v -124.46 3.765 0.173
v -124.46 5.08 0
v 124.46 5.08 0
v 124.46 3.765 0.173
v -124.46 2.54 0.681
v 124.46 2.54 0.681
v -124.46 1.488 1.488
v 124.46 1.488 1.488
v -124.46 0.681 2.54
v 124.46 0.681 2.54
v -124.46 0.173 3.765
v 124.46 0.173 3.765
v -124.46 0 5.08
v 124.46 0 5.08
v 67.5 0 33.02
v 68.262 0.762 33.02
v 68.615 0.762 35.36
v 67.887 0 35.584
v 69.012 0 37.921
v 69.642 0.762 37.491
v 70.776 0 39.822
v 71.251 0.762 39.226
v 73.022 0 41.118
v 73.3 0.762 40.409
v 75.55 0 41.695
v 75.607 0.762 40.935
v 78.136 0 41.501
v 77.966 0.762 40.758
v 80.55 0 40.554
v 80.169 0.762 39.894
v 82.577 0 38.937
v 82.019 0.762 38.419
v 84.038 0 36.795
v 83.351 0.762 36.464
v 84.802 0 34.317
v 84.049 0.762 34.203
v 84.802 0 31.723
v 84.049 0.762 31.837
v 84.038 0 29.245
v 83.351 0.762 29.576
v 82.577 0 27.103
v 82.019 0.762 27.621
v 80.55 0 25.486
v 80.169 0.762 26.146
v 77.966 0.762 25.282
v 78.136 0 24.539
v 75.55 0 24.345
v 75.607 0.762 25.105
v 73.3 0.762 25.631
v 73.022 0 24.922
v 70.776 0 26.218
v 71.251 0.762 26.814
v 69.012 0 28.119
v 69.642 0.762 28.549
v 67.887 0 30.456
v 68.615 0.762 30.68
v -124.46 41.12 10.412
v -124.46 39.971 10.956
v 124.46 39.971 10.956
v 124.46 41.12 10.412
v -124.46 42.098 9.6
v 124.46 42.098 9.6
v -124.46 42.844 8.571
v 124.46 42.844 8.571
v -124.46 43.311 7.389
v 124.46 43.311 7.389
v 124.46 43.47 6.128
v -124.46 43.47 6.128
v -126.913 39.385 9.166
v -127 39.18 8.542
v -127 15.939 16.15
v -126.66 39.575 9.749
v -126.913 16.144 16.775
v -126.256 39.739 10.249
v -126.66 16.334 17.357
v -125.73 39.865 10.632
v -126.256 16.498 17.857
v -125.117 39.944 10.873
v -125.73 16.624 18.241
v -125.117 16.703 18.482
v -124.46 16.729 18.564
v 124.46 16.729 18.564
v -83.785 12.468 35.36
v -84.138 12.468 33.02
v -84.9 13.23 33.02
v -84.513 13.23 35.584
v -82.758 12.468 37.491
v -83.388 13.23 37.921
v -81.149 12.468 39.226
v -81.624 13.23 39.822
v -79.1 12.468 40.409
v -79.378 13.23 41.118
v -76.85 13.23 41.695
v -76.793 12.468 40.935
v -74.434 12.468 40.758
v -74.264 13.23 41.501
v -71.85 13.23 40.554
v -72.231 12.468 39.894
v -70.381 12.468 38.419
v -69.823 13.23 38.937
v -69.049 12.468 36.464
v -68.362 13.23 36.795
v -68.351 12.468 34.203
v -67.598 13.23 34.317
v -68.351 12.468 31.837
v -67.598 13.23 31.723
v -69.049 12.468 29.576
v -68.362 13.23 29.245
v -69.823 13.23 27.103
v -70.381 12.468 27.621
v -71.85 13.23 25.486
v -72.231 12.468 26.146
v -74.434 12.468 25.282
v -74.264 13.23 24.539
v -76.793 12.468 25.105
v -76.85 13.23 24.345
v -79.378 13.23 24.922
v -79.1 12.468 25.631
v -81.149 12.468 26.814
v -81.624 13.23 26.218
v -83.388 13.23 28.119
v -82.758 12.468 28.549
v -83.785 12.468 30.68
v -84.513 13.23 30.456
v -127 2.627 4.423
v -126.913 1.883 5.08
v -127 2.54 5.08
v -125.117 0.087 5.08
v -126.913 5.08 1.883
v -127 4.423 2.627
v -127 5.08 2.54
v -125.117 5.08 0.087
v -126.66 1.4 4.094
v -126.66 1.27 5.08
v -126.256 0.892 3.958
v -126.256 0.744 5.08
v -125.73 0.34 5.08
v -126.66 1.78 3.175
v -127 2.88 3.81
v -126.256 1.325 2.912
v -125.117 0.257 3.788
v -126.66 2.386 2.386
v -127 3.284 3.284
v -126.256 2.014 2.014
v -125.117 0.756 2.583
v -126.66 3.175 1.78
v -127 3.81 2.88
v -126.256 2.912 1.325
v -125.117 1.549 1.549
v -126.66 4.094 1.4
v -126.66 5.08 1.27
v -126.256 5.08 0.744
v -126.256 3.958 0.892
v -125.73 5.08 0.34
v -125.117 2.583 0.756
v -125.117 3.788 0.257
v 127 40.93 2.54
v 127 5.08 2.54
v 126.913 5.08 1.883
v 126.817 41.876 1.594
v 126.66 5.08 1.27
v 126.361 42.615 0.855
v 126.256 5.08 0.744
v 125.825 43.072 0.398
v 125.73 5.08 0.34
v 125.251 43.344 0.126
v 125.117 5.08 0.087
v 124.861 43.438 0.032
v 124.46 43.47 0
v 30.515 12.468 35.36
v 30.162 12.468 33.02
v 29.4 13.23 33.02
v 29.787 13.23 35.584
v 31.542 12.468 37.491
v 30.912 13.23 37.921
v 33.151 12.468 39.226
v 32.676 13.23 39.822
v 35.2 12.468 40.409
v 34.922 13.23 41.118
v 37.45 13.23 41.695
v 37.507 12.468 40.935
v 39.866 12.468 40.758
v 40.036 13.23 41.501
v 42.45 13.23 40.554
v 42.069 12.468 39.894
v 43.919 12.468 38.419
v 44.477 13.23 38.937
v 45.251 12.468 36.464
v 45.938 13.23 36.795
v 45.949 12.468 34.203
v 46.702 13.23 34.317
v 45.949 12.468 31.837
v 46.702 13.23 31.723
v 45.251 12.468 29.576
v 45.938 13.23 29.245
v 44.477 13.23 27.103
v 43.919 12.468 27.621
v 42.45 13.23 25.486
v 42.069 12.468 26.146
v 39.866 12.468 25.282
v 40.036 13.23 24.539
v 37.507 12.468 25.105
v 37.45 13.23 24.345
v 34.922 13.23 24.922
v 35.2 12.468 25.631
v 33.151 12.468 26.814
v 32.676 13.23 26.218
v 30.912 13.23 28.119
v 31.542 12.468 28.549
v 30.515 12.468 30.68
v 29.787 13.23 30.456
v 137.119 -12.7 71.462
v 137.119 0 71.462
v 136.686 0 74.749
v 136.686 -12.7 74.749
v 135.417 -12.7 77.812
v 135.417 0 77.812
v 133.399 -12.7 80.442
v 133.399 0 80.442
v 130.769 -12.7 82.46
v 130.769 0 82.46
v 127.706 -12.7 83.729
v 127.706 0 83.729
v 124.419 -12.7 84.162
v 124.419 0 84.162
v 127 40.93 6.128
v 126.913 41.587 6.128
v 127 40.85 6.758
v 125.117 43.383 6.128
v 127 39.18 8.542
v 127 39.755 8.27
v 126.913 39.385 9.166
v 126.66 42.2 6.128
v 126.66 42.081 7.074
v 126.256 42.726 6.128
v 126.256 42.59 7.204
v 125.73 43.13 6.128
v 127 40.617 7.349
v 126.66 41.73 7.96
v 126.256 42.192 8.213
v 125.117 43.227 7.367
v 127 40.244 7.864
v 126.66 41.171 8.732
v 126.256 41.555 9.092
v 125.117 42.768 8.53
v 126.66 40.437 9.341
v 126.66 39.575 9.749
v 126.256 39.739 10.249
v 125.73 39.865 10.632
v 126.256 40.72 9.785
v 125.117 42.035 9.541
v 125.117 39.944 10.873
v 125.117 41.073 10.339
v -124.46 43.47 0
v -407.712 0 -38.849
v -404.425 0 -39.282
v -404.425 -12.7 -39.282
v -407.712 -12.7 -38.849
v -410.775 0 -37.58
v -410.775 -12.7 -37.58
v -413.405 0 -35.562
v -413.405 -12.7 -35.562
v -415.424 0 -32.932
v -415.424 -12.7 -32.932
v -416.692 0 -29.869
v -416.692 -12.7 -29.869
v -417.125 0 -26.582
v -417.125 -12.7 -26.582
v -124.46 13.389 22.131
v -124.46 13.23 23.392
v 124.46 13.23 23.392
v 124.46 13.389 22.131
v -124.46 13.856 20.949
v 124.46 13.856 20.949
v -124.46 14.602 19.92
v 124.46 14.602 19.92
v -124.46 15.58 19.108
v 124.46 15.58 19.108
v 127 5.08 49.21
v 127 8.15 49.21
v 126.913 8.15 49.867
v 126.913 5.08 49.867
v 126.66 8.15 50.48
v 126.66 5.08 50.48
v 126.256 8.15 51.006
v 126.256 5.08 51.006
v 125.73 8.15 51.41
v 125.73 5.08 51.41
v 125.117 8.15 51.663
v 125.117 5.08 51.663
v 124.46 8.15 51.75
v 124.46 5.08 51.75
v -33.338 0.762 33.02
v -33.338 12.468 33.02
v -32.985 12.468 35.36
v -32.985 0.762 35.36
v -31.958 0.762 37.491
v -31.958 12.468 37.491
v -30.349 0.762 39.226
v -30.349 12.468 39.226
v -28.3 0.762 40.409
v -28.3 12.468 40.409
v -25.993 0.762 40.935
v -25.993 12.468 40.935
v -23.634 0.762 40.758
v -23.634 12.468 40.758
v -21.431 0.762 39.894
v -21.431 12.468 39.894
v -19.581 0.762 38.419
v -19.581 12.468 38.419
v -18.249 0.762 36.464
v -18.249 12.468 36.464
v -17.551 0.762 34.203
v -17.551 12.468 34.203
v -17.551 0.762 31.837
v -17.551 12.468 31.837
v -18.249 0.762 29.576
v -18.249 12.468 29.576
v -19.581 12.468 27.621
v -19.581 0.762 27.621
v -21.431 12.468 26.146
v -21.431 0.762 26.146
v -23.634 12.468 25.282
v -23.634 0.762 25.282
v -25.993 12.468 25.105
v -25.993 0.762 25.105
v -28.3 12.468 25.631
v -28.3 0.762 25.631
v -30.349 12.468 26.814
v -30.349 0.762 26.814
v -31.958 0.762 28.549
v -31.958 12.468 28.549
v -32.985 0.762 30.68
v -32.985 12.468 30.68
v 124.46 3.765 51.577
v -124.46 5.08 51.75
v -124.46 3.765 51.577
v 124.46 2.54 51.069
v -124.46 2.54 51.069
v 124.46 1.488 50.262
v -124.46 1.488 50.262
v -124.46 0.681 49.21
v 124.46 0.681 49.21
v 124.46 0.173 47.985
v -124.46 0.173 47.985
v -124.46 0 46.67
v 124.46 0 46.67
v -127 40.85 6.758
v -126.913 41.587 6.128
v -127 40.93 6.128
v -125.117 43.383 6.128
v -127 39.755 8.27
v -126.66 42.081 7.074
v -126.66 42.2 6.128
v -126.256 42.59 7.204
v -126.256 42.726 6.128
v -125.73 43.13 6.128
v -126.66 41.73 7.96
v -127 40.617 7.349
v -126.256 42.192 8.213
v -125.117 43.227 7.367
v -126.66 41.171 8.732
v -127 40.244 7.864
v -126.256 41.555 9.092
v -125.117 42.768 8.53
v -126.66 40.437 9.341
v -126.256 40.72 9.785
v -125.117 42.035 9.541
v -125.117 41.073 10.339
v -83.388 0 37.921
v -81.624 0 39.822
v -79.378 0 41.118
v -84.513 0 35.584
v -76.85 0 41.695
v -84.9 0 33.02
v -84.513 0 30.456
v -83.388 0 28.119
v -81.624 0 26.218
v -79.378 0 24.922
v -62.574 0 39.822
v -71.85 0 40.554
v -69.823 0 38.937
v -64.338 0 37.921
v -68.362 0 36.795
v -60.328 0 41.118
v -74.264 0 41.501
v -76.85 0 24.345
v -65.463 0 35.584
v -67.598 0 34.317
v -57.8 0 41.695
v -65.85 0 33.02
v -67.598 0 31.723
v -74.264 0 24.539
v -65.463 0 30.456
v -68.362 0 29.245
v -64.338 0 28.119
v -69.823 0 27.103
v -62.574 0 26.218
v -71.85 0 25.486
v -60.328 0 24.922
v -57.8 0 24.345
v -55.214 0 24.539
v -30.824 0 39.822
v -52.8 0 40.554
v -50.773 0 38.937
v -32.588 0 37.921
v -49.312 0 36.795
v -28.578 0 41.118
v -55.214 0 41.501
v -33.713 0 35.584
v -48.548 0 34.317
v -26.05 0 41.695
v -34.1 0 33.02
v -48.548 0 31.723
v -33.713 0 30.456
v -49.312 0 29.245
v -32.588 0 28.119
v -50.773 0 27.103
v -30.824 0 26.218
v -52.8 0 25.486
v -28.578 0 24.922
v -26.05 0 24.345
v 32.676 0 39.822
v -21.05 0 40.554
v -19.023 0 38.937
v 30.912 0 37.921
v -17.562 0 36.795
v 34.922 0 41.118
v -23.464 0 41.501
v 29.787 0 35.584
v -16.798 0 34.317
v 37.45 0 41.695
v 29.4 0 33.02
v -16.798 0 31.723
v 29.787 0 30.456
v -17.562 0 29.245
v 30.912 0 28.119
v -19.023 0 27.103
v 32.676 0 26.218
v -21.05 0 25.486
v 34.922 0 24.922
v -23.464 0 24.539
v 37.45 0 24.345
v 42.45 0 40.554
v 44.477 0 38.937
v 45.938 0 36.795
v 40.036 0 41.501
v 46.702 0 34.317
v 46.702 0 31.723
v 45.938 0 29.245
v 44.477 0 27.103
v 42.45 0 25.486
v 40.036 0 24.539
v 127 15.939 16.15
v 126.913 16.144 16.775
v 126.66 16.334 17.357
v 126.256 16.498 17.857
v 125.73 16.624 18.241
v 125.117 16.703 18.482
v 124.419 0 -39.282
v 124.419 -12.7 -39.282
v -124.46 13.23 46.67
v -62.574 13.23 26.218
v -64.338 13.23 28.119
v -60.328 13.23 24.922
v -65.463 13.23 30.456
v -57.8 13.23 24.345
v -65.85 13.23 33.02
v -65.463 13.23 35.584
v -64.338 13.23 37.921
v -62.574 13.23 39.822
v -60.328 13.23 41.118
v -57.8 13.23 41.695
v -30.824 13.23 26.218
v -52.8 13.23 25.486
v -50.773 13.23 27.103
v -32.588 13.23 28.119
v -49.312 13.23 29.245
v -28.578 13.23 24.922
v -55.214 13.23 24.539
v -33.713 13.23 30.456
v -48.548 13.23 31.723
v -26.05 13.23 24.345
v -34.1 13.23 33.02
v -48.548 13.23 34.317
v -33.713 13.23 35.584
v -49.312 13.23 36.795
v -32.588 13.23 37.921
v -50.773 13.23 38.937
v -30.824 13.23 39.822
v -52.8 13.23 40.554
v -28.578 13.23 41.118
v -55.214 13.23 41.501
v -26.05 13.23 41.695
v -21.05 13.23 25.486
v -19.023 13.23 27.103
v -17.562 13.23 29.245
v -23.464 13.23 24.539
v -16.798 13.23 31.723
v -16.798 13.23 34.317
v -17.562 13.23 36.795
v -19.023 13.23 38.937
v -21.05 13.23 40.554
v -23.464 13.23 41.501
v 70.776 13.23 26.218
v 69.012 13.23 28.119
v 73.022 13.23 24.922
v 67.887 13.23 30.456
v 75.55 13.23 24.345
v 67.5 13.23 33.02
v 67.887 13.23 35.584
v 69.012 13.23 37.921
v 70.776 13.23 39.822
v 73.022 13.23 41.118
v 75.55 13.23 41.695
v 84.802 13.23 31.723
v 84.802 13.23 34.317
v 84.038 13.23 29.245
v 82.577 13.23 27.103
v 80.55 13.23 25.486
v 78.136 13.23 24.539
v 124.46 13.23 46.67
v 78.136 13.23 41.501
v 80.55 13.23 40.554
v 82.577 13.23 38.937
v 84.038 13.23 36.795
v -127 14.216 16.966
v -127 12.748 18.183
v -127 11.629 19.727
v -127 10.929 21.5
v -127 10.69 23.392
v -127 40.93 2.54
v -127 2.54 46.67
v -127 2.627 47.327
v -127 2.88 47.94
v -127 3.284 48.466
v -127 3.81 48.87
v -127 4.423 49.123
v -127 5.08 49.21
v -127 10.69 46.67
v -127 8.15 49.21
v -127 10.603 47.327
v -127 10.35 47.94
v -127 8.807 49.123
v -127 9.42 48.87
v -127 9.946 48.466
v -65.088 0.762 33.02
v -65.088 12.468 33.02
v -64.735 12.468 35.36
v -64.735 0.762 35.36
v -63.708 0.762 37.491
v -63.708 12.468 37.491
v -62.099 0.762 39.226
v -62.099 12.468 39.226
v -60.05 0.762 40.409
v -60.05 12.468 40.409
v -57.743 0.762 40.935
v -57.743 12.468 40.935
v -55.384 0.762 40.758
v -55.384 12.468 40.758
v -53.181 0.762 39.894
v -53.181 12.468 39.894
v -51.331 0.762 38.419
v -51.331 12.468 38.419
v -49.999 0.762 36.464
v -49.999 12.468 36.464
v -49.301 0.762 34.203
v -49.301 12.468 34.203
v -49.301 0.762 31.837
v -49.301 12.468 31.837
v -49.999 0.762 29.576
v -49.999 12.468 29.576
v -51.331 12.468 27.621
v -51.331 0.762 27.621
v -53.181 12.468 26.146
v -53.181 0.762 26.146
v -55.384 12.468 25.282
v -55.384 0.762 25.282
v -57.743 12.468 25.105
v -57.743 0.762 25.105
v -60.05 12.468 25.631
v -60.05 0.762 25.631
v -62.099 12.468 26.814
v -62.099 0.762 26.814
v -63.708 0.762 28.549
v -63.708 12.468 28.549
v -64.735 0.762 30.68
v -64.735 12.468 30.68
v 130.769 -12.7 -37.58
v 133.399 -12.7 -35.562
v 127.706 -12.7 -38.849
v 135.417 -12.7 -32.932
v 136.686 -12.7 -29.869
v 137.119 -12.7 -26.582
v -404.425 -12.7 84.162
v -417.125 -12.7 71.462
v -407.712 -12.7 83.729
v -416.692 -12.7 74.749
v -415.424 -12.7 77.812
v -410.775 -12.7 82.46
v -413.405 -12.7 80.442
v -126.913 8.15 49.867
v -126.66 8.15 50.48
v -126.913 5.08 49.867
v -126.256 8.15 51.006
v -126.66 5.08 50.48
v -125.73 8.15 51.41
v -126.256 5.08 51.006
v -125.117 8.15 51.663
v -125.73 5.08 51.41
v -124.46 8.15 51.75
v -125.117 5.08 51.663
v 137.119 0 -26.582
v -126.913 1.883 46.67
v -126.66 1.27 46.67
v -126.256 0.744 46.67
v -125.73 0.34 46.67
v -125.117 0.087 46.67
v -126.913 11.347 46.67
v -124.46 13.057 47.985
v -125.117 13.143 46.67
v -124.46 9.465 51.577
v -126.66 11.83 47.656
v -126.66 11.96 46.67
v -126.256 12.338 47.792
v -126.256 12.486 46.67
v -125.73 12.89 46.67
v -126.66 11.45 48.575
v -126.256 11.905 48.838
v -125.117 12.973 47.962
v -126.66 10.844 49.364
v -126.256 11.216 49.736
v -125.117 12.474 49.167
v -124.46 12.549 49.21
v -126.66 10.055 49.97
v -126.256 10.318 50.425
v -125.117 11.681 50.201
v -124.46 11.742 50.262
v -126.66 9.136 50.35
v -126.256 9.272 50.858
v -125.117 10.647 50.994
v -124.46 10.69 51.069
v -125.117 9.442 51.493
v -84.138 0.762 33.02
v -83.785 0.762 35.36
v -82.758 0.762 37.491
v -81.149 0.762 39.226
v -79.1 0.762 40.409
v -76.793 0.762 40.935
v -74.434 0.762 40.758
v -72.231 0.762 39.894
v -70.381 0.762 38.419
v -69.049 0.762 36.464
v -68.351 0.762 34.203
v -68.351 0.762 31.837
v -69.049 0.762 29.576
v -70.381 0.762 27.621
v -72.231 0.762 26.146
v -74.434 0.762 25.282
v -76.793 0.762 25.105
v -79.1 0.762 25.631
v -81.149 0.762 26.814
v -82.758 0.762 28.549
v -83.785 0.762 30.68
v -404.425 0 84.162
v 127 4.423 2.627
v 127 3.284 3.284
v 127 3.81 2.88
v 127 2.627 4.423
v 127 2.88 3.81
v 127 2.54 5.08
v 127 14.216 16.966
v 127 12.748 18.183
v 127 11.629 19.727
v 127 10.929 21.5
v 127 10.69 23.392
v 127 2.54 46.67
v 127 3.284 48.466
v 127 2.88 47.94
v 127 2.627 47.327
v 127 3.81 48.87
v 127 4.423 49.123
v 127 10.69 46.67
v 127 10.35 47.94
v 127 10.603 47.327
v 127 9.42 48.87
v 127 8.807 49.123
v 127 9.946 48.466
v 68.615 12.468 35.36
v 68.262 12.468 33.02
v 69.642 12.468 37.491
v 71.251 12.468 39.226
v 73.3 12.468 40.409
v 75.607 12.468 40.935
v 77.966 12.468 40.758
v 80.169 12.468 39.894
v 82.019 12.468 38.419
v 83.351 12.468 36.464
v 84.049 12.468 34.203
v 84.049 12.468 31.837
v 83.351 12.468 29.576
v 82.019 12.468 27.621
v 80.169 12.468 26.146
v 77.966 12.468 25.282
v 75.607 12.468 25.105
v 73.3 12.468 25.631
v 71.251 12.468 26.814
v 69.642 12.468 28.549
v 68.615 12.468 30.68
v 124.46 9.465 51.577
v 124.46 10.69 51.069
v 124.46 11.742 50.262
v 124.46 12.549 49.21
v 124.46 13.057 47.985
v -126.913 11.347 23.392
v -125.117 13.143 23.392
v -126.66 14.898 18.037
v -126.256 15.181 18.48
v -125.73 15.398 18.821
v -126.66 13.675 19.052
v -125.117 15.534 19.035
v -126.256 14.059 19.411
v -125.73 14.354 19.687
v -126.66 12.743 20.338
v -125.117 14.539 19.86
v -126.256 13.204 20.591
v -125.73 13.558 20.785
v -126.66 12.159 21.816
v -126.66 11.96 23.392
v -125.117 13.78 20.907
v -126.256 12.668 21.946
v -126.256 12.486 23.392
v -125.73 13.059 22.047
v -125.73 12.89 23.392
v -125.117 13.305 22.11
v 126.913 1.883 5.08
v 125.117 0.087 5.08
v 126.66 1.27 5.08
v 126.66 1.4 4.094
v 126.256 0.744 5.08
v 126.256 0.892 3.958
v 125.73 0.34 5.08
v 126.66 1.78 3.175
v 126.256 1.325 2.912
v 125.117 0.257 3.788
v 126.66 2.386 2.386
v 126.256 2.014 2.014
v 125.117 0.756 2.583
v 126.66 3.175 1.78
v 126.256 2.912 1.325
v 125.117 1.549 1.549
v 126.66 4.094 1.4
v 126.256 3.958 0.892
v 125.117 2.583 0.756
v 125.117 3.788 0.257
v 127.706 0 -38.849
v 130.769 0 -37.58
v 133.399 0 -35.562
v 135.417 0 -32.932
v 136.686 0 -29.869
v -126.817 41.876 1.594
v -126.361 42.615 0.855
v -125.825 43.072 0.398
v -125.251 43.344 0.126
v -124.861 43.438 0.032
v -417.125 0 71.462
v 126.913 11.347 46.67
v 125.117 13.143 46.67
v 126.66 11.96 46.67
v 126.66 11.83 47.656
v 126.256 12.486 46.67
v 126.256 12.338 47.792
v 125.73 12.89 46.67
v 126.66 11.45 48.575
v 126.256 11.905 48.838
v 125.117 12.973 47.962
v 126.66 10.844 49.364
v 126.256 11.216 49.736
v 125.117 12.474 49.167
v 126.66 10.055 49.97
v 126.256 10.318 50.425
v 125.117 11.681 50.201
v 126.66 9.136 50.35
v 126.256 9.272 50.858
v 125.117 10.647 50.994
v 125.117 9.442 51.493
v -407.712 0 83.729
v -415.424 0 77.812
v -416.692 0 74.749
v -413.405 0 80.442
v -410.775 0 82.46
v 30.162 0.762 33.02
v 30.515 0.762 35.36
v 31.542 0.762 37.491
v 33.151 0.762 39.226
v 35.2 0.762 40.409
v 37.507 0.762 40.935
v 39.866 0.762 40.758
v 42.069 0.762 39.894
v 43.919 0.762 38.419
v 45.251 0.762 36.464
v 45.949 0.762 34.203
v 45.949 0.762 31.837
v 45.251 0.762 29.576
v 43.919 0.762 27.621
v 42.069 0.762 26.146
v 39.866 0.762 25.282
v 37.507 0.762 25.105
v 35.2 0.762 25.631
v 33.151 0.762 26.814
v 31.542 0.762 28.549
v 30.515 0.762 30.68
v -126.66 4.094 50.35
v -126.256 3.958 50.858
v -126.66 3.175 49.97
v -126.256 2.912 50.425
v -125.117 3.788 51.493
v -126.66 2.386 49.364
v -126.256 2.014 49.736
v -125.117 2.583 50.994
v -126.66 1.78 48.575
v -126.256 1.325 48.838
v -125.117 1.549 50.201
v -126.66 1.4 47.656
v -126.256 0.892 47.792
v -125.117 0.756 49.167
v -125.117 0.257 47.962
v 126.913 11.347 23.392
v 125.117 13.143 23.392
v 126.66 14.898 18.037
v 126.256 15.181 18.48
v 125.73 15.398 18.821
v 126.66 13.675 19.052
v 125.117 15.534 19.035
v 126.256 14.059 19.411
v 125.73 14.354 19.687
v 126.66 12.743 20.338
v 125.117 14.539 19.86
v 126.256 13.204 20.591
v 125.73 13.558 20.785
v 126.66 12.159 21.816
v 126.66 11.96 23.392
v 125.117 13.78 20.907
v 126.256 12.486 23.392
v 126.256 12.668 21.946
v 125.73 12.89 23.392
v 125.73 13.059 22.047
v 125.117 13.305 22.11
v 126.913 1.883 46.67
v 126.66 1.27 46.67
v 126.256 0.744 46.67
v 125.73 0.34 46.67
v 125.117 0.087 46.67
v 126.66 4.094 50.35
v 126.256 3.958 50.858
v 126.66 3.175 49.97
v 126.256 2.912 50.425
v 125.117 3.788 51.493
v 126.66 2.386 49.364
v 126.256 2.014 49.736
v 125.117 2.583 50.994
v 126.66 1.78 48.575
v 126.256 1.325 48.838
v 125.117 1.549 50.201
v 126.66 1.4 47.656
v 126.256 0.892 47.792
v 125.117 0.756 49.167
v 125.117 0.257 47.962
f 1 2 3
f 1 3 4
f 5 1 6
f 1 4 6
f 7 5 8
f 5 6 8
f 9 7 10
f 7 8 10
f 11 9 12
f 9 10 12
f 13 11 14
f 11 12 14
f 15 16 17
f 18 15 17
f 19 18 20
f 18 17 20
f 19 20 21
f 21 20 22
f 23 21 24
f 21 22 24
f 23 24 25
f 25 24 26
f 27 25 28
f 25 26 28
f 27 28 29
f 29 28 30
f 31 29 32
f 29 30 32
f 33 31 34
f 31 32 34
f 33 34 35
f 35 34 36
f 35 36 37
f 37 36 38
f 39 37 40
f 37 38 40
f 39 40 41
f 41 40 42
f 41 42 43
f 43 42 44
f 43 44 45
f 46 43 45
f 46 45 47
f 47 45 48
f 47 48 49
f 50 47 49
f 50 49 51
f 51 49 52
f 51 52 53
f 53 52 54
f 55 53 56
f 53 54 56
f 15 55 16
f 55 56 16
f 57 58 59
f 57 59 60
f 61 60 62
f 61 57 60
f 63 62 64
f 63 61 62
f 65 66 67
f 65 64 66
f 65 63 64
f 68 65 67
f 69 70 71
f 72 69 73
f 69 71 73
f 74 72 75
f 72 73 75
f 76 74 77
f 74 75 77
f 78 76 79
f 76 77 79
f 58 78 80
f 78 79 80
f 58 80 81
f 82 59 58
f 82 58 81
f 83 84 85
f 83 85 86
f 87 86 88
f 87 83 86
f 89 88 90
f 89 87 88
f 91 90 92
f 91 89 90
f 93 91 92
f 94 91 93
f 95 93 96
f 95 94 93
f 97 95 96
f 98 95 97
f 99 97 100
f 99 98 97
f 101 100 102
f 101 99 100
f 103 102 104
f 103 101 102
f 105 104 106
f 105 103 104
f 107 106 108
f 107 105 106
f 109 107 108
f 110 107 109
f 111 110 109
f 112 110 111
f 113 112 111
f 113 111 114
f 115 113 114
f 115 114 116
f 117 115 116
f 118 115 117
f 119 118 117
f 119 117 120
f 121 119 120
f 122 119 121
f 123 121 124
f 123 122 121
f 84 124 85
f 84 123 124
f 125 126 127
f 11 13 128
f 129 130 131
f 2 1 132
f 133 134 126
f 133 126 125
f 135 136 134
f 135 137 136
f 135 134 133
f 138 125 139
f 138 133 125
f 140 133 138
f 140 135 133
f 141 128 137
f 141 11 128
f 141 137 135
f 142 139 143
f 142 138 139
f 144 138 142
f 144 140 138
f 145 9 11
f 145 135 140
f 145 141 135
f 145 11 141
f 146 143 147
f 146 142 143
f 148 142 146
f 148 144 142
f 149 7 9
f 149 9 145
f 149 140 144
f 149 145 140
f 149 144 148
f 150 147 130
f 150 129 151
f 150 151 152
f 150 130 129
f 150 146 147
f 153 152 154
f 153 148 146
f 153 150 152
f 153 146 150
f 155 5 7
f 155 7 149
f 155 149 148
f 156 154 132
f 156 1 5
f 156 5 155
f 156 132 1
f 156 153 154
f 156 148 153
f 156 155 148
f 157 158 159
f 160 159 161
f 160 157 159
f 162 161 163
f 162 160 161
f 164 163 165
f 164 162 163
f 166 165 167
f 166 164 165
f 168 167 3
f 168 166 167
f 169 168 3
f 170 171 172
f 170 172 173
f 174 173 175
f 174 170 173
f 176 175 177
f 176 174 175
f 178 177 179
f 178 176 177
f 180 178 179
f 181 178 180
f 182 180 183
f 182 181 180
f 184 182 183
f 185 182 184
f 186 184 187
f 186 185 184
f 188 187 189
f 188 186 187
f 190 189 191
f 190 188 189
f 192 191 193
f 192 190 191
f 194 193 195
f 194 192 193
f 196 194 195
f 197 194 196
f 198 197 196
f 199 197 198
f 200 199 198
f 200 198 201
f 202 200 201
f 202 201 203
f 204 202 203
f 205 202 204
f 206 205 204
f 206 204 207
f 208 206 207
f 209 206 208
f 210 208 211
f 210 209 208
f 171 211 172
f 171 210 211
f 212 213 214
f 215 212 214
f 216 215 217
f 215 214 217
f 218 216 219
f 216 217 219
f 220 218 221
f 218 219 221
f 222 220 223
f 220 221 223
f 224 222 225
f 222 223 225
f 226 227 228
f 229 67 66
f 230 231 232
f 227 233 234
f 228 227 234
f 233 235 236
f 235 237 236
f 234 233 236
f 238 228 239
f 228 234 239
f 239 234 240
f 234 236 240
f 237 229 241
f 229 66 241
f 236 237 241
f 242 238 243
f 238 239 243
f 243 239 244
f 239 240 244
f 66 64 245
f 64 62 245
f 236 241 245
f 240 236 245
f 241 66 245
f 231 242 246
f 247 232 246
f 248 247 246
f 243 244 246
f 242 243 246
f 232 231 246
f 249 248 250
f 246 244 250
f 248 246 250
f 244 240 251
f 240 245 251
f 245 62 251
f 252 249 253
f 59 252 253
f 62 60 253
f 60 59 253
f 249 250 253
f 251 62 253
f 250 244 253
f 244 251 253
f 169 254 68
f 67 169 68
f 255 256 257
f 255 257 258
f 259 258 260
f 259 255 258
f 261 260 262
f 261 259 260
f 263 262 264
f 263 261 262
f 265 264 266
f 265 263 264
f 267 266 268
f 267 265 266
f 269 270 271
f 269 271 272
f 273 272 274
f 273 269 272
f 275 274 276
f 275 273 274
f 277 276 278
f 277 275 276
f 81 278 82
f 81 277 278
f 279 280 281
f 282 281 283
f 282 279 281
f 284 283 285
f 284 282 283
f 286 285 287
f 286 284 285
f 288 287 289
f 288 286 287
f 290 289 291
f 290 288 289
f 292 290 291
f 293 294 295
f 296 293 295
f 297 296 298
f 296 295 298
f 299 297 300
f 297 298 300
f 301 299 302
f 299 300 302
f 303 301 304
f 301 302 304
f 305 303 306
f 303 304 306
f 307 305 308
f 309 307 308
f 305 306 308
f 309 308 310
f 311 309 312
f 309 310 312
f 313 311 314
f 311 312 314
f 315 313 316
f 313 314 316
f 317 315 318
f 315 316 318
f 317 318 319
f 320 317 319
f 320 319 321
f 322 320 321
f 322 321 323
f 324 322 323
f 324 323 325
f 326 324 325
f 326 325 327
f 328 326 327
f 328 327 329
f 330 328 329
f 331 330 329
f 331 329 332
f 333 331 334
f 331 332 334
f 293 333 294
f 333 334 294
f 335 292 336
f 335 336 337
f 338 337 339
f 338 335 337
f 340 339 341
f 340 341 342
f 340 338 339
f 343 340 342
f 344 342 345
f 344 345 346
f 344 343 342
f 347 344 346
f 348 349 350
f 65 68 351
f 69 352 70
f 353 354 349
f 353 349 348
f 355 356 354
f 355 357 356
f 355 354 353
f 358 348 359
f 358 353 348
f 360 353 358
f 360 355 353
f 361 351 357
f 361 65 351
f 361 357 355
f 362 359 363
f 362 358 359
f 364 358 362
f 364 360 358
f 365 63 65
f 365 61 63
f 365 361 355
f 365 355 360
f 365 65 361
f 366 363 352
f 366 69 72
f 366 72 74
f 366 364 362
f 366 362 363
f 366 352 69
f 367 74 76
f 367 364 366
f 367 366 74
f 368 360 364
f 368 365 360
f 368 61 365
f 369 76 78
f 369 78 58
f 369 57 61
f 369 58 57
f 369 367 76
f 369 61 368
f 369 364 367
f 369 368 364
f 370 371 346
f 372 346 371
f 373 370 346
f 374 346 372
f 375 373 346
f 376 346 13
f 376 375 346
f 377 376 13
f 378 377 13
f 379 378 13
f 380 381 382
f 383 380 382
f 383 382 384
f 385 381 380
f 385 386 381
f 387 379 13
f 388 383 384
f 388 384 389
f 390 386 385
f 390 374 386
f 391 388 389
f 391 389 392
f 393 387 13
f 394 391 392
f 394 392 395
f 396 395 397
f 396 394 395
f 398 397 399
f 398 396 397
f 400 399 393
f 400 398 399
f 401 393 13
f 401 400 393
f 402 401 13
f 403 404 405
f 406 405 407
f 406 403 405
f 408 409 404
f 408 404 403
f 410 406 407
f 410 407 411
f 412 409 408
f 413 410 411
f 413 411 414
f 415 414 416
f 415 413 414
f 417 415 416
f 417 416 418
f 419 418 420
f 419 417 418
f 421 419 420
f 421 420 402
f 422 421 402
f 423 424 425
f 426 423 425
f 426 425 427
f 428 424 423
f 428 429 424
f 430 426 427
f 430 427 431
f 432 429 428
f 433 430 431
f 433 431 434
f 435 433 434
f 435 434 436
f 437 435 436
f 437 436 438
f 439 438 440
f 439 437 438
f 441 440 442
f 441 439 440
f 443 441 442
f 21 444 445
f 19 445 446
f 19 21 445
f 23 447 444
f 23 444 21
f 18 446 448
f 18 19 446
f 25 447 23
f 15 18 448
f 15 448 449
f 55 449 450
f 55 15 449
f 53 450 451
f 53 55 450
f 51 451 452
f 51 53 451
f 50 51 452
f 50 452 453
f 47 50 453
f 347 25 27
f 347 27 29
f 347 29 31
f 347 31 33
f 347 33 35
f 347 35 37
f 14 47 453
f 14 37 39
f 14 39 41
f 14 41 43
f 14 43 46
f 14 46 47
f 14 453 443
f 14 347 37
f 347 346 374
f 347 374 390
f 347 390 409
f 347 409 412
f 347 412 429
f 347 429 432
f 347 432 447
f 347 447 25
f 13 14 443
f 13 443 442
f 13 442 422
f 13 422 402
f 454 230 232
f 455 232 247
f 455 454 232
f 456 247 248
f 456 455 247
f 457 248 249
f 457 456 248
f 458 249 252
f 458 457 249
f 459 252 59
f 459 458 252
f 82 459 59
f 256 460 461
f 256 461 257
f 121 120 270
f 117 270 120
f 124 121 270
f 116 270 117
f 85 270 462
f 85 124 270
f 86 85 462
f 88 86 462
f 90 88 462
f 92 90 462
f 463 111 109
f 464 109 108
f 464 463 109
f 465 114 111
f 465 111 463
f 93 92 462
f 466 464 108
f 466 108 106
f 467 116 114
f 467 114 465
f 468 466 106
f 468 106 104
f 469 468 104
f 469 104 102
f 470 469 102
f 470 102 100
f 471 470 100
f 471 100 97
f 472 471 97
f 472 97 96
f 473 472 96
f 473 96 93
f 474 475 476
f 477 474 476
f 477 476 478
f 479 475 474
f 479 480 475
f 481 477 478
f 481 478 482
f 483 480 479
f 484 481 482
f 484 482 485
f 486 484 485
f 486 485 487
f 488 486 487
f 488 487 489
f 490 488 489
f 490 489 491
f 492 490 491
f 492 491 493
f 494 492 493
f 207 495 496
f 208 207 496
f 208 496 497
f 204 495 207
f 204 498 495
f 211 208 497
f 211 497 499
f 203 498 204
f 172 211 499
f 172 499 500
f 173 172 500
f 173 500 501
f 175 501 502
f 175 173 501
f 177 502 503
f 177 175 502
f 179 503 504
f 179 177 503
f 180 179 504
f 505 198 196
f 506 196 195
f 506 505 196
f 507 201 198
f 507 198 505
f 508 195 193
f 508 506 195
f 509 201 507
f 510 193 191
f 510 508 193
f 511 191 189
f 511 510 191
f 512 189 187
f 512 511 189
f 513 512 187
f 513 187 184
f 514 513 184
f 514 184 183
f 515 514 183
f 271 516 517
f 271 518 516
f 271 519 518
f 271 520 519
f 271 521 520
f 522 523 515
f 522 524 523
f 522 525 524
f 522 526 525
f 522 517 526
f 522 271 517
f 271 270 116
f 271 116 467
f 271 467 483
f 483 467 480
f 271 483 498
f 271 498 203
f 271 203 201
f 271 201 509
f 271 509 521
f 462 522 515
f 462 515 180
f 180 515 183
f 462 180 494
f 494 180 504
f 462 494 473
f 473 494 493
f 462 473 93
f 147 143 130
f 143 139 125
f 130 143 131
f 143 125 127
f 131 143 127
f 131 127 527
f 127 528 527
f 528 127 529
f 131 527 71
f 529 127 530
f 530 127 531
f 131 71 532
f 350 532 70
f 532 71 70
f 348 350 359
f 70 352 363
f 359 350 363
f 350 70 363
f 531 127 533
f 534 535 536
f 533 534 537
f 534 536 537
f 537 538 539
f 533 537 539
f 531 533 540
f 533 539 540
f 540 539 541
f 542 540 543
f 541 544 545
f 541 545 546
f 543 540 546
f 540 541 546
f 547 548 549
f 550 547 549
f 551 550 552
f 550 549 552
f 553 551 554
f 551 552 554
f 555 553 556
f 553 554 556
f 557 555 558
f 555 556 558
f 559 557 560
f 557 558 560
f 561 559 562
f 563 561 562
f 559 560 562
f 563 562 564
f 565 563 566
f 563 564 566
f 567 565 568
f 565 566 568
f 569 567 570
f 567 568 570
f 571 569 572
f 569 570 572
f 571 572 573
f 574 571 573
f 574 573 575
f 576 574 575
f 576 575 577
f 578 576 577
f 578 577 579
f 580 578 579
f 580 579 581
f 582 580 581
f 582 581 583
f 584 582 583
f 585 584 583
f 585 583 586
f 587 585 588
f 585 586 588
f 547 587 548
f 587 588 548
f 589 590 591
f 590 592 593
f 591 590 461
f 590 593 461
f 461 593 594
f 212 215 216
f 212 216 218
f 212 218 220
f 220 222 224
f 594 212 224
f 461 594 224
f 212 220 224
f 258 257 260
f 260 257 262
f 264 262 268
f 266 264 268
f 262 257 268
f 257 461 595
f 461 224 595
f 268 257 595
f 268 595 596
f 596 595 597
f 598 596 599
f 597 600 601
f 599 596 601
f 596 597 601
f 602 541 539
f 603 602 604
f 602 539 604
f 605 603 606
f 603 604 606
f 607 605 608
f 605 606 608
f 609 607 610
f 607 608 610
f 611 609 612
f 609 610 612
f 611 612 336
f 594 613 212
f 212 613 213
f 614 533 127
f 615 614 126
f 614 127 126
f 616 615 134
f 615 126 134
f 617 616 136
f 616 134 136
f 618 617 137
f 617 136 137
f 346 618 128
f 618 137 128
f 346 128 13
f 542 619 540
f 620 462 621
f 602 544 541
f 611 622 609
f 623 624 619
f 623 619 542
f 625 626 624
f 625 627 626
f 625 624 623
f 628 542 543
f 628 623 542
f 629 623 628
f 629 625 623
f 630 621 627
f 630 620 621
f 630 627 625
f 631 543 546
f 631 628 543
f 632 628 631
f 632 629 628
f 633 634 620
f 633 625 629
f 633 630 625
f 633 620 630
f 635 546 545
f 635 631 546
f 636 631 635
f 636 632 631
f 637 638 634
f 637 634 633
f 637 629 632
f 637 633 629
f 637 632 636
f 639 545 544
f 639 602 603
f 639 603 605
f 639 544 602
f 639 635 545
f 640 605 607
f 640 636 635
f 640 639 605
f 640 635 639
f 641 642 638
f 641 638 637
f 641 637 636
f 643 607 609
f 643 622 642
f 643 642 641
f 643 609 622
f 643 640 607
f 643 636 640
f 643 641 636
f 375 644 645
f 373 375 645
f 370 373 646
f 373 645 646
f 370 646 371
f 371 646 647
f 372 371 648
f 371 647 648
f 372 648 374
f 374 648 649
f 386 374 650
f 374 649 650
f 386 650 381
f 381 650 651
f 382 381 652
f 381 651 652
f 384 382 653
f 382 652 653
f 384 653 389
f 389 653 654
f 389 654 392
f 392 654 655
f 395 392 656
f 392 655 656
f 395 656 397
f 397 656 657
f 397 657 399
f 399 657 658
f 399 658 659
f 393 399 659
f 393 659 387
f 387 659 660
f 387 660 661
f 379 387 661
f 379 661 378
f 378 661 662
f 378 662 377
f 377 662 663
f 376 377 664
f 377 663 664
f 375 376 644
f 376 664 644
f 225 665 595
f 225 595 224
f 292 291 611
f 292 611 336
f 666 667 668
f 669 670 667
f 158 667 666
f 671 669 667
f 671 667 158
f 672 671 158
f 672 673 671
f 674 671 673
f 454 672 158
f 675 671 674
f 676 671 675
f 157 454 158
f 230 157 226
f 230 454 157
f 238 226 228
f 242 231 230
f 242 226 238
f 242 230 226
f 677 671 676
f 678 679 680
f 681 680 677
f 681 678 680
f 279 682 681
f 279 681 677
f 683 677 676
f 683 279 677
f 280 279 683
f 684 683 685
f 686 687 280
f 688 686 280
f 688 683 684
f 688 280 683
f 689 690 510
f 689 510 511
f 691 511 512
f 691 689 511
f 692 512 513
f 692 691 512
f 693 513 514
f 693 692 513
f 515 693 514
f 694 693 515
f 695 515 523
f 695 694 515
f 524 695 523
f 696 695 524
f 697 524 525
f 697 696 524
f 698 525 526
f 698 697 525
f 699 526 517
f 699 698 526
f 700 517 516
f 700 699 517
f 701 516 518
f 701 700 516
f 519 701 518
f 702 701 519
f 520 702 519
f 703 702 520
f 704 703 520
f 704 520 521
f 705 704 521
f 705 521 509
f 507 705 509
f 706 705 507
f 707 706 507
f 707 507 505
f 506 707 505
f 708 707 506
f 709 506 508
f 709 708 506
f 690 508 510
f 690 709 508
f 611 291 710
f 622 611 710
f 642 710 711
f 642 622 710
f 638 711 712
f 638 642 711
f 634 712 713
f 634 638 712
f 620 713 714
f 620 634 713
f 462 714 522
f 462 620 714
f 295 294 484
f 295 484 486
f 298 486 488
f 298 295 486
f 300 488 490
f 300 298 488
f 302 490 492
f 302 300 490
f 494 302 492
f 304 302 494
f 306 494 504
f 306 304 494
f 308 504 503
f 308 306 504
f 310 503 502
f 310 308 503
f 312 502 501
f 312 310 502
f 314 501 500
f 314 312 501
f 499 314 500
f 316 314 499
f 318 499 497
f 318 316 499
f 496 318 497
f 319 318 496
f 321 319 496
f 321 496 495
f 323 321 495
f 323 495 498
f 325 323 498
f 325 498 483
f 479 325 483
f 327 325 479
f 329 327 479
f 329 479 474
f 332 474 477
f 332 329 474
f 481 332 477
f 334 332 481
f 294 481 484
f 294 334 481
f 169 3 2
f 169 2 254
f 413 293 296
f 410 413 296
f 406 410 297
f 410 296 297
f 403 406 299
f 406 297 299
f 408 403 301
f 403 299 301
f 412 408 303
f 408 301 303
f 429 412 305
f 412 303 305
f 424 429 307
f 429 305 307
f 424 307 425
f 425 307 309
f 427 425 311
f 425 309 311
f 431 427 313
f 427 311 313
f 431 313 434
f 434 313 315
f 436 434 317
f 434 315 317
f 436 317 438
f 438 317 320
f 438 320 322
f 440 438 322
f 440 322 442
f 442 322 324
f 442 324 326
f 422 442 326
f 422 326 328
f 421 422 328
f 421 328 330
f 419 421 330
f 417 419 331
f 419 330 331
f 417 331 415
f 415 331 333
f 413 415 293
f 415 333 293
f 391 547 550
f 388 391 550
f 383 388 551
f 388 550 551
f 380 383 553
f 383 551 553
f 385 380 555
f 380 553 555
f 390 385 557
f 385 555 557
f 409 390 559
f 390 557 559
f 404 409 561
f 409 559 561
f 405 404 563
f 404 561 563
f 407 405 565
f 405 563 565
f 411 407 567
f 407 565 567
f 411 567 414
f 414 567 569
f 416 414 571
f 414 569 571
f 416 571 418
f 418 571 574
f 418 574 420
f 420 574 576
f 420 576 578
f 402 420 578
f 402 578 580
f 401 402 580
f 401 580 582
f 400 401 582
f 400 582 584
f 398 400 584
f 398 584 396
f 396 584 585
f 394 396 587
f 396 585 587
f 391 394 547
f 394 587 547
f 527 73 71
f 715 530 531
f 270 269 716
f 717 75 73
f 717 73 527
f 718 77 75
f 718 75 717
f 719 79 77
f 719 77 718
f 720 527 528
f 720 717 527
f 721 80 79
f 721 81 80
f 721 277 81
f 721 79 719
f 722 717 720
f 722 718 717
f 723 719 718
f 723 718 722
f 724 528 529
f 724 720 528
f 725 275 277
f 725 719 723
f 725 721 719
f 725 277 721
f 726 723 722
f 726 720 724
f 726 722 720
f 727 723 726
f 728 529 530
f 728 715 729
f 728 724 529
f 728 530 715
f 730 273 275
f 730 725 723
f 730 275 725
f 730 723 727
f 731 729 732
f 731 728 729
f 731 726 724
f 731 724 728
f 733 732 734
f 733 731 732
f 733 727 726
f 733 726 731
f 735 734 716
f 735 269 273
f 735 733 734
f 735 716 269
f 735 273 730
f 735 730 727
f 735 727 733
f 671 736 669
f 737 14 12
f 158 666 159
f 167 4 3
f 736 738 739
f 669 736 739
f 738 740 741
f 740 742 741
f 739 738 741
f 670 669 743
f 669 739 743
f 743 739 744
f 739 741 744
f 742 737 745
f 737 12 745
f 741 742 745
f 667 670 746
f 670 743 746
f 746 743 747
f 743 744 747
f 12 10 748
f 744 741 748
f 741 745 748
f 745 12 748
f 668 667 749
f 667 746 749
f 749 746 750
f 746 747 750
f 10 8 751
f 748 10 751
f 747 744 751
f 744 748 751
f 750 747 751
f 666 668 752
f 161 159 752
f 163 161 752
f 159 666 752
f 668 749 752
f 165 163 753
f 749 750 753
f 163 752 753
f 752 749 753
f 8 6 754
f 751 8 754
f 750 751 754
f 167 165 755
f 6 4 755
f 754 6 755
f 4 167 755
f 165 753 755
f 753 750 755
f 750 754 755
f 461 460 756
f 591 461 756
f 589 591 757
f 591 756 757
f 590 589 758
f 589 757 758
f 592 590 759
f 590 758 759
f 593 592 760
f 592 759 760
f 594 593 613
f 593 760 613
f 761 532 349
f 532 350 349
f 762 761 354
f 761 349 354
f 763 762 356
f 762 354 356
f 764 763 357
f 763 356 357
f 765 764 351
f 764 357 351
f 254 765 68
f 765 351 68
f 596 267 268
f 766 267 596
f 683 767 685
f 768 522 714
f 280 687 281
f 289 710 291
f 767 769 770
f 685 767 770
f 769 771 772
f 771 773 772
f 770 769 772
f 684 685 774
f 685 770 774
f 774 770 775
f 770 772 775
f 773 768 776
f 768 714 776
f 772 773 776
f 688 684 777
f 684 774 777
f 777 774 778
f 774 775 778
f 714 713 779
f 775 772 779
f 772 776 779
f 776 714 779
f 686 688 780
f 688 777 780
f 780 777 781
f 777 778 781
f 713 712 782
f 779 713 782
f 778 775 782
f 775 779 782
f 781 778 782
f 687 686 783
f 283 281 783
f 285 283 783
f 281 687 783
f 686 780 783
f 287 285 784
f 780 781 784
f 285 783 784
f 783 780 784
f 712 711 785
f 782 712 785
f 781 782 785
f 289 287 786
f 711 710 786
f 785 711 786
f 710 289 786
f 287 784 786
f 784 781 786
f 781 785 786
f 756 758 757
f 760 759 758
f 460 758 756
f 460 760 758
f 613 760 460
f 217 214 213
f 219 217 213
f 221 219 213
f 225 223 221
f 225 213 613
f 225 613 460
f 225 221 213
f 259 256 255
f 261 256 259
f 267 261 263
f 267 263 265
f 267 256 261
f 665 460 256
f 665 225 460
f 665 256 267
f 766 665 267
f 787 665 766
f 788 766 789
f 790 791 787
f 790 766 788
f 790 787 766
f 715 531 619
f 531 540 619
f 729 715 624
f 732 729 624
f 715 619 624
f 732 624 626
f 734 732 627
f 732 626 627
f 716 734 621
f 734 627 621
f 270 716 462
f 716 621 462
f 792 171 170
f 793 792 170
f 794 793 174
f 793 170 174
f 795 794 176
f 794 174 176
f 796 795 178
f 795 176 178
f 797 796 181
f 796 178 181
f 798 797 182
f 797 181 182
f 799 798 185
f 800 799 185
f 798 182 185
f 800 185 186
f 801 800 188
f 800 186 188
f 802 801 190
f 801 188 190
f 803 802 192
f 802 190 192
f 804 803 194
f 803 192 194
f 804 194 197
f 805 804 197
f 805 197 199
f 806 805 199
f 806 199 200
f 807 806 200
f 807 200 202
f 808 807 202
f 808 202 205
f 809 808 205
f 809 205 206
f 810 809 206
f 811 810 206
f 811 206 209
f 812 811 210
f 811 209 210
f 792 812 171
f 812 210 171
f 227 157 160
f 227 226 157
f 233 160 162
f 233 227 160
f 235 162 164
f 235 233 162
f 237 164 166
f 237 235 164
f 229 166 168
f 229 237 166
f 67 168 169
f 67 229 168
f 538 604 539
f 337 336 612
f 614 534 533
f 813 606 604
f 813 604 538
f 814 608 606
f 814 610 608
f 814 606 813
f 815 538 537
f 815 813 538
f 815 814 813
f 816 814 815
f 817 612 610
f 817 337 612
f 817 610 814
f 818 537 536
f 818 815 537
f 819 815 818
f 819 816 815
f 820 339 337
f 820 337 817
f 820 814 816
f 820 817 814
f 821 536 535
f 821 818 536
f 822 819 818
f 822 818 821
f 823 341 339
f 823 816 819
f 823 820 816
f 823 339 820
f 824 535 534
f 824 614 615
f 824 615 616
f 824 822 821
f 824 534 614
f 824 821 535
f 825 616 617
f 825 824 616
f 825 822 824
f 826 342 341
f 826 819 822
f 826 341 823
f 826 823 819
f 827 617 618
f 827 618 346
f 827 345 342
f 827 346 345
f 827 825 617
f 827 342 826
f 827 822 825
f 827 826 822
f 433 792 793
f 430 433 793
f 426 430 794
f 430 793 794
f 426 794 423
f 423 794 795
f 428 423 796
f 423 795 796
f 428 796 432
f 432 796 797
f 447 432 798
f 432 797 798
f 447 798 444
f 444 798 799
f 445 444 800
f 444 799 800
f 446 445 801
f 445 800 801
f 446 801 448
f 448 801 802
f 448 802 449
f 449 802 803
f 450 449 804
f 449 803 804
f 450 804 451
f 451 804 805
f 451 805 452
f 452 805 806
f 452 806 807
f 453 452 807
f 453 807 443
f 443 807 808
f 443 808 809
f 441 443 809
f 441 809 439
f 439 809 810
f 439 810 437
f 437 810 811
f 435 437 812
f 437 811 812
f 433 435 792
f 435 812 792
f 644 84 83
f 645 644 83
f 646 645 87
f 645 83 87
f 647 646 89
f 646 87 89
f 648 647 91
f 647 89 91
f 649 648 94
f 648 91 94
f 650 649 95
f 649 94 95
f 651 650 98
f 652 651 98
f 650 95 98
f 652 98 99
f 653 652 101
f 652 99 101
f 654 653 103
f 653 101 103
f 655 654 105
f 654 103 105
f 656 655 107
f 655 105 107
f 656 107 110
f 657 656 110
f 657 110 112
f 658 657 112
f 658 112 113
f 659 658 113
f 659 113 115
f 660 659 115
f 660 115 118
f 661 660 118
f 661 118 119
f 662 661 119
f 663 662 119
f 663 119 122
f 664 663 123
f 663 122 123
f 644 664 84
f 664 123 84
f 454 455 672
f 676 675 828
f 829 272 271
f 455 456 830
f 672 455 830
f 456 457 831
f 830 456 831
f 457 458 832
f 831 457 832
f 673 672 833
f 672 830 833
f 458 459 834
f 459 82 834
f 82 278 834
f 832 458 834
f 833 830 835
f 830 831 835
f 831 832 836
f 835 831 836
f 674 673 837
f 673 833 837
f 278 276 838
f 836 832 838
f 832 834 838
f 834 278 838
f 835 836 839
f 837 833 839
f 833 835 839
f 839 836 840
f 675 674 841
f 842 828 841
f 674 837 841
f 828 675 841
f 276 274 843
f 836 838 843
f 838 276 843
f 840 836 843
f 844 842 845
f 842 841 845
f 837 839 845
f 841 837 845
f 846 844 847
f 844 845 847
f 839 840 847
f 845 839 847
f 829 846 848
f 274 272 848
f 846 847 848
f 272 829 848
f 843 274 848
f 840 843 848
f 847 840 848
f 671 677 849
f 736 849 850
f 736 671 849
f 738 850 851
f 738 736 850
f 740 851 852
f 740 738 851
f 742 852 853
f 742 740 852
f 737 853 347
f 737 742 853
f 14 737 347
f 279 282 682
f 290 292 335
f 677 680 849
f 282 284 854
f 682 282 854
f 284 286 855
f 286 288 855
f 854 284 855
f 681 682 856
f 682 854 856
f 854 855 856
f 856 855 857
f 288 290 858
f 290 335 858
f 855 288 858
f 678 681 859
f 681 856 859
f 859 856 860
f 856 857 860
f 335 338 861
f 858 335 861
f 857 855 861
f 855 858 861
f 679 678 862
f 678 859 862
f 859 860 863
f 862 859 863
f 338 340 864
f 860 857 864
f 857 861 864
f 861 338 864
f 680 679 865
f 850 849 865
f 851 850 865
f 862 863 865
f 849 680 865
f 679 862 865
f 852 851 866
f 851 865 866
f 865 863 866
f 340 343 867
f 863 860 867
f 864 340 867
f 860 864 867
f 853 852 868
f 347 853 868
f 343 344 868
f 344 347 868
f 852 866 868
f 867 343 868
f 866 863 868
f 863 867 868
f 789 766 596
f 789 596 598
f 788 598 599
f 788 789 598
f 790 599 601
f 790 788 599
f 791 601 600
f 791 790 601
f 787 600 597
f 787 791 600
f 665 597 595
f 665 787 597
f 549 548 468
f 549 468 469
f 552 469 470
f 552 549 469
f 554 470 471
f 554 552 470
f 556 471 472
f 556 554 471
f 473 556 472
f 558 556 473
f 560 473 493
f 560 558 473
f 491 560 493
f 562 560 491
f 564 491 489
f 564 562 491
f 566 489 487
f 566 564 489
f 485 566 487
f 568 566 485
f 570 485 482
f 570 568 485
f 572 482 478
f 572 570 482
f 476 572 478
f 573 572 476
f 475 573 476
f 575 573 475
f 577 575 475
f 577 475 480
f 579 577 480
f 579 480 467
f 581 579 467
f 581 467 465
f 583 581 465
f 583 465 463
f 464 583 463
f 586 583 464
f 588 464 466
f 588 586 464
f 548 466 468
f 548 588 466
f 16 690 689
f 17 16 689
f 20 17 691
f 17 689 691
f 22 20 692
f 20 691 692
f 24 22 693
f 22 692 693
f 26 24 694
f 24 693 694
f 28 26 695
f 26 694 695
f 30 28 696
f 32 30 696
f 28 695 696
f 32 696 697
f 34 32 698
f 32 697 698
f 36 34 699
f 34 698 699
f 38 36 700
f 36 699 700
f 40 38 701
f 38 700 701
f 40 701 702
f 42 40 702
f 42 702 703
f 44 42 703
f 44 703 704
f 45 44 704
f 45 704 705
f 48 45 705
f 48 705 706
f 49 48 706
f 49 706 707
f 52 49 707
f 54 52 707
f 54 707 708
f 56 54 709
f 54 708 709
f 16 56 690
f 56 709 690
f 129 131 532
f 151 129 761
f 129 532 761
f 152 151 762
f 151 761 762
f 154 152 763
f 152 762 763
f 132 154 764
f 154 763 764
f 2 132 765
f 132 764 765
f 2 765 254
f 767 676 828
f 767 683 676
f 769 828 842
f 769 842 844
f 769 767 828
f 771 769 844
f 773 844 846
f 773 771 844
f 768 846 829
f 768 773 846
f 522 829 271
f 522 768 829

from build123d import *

# Parameters (mm, degrees)
F1_DEPTH = 127
F2_R     = 5.08
F3_R     = 2.54
F4_R     = 7.9375
F5_DEPTH = 13.2299996912
F6_SIZE  = 0.762
F8_DEPTH = 12.7


with BuildPart() as f1:
    # F0 (on Right) → F1 (new body, symmetric)
    with BuildSketch(Plane.YZ):
        Polygon((13.2299996912, 51.7500005662), (0, 51.7500005662), (0, 0), (13.2299996912, 0), (43.4699989855, 0), (43.4699989855, 9.810000658), (13.2299996912, 19.7100006044), align=None)
    extrude(amount=F1_DEPTH, both=True)

    # F2
    f2_edges = [f1.edges().sort_by_distance(p)[0] for p in [
        (0, 0, 51.750001),
        (0, 0, 0),
        (0, 43.469999, 9.810001),
        (0, 13.23, 51.750001),
        (0, 13.23, 19.710001),
    ]]
    fillet(f2_edges, radius=F2_R)

    # F3
    f3_edges = [f1.edges().sort_by_distance(p)[0] for p in [
        (-127, 0, 25.875),
        (127, 0, 25.875),
    ]]
    fillet(f3_edges, radius=F3_R)

    # F4 (on face) → F5 (cut, through all)
    with BuildSketch(Plane(origin=(0, 13.2299996912, 0), x_dir=(-1, 0, 0), z_dir=(0, 1, 0))):
        with Locations((-76.2, 33.02)):
            Circle(F4_R)
        with Locations((-38.1, 33.02)):
            Circle(F4_R)
        with Locations((25.4, 33.02)):
            Circle(F4_R)
        with Locations((57.15, 33.02)):
            Circle(F4_R)
        with Locations((76.2, 33.02)):
            Circle(F4_R)
    extrude(amount=-F5_DEPTH, mode=Mode.SUBTRACT)

    # F6
    f6_edges = [f1.edges().sort_by_distance(p)[0] for p in [
        (68.2625, 6.615, 33.02),
        (84.1375, 13.23, 33.02),
        (84.1375, 0, 33.02),
        (30.1625, 6.615, 33.02),
        (46.0375, 13.23, 33.02),
        (46.0375, 0, 33.02),
        (-33.3375, 6.615, 33.02),
        (-17.4625, 13.23, 33.02),
        (-17.4625, 0, 33.02),
        (-65.0875, 6.615, 33.02),
        (-49.2125, 13.23, 33.02),
        (-49.2125, 0, 33.02),
        (-84.1375, 6.615, 33.02),
        (-68.2625, 13.23, 33.02),
        (-68.2625, 0, 33.02),
    ]]
    chamfer(f6_edges, length=F6_SIZE)


with BuildPart() as f8:
    # F7 (on Front) → F8 (new body)
    with BuildSketch(Plane.XZ):
        with BuildLine():
            ThreePointArc((137.1185183525, 71.4619266033), (133.3987744736, 80.4421827244), (124.4185183525, 84.1619266033))
            Line((124.4185183525, 84.1619266033), (-140.0033086538, 84.1619266033))
            Line((-140.0033086538, 84.1619266033), (-140.0033086538, -39.2818041146))
            Line((-140.0033086538, -39.2818041146), (124.4185183525, -39.2818041146))
            ThreePointArc((124.4185183525, -39.2818041146), (133.3987744736, -35.5620602356), (137.1185183525, -26.5818041146))
            Line((137.1185183525, -26.5818041146), (137.1185183525, 71.4619266033))
        make_face()
    extrude(amount=F8_DEPTH)

    # F9: F8 across face


with BuildPart() as f8_1:
    add(f8.part)
    add(f8.part.mirror(Plane(origin=(-140.0033086538, -6.35, 22.4400612444), x_dir=(0, -1, 0), z_dir=(-1, 0, 0))))


solid = Compound([f1.part, f8_1.part])
